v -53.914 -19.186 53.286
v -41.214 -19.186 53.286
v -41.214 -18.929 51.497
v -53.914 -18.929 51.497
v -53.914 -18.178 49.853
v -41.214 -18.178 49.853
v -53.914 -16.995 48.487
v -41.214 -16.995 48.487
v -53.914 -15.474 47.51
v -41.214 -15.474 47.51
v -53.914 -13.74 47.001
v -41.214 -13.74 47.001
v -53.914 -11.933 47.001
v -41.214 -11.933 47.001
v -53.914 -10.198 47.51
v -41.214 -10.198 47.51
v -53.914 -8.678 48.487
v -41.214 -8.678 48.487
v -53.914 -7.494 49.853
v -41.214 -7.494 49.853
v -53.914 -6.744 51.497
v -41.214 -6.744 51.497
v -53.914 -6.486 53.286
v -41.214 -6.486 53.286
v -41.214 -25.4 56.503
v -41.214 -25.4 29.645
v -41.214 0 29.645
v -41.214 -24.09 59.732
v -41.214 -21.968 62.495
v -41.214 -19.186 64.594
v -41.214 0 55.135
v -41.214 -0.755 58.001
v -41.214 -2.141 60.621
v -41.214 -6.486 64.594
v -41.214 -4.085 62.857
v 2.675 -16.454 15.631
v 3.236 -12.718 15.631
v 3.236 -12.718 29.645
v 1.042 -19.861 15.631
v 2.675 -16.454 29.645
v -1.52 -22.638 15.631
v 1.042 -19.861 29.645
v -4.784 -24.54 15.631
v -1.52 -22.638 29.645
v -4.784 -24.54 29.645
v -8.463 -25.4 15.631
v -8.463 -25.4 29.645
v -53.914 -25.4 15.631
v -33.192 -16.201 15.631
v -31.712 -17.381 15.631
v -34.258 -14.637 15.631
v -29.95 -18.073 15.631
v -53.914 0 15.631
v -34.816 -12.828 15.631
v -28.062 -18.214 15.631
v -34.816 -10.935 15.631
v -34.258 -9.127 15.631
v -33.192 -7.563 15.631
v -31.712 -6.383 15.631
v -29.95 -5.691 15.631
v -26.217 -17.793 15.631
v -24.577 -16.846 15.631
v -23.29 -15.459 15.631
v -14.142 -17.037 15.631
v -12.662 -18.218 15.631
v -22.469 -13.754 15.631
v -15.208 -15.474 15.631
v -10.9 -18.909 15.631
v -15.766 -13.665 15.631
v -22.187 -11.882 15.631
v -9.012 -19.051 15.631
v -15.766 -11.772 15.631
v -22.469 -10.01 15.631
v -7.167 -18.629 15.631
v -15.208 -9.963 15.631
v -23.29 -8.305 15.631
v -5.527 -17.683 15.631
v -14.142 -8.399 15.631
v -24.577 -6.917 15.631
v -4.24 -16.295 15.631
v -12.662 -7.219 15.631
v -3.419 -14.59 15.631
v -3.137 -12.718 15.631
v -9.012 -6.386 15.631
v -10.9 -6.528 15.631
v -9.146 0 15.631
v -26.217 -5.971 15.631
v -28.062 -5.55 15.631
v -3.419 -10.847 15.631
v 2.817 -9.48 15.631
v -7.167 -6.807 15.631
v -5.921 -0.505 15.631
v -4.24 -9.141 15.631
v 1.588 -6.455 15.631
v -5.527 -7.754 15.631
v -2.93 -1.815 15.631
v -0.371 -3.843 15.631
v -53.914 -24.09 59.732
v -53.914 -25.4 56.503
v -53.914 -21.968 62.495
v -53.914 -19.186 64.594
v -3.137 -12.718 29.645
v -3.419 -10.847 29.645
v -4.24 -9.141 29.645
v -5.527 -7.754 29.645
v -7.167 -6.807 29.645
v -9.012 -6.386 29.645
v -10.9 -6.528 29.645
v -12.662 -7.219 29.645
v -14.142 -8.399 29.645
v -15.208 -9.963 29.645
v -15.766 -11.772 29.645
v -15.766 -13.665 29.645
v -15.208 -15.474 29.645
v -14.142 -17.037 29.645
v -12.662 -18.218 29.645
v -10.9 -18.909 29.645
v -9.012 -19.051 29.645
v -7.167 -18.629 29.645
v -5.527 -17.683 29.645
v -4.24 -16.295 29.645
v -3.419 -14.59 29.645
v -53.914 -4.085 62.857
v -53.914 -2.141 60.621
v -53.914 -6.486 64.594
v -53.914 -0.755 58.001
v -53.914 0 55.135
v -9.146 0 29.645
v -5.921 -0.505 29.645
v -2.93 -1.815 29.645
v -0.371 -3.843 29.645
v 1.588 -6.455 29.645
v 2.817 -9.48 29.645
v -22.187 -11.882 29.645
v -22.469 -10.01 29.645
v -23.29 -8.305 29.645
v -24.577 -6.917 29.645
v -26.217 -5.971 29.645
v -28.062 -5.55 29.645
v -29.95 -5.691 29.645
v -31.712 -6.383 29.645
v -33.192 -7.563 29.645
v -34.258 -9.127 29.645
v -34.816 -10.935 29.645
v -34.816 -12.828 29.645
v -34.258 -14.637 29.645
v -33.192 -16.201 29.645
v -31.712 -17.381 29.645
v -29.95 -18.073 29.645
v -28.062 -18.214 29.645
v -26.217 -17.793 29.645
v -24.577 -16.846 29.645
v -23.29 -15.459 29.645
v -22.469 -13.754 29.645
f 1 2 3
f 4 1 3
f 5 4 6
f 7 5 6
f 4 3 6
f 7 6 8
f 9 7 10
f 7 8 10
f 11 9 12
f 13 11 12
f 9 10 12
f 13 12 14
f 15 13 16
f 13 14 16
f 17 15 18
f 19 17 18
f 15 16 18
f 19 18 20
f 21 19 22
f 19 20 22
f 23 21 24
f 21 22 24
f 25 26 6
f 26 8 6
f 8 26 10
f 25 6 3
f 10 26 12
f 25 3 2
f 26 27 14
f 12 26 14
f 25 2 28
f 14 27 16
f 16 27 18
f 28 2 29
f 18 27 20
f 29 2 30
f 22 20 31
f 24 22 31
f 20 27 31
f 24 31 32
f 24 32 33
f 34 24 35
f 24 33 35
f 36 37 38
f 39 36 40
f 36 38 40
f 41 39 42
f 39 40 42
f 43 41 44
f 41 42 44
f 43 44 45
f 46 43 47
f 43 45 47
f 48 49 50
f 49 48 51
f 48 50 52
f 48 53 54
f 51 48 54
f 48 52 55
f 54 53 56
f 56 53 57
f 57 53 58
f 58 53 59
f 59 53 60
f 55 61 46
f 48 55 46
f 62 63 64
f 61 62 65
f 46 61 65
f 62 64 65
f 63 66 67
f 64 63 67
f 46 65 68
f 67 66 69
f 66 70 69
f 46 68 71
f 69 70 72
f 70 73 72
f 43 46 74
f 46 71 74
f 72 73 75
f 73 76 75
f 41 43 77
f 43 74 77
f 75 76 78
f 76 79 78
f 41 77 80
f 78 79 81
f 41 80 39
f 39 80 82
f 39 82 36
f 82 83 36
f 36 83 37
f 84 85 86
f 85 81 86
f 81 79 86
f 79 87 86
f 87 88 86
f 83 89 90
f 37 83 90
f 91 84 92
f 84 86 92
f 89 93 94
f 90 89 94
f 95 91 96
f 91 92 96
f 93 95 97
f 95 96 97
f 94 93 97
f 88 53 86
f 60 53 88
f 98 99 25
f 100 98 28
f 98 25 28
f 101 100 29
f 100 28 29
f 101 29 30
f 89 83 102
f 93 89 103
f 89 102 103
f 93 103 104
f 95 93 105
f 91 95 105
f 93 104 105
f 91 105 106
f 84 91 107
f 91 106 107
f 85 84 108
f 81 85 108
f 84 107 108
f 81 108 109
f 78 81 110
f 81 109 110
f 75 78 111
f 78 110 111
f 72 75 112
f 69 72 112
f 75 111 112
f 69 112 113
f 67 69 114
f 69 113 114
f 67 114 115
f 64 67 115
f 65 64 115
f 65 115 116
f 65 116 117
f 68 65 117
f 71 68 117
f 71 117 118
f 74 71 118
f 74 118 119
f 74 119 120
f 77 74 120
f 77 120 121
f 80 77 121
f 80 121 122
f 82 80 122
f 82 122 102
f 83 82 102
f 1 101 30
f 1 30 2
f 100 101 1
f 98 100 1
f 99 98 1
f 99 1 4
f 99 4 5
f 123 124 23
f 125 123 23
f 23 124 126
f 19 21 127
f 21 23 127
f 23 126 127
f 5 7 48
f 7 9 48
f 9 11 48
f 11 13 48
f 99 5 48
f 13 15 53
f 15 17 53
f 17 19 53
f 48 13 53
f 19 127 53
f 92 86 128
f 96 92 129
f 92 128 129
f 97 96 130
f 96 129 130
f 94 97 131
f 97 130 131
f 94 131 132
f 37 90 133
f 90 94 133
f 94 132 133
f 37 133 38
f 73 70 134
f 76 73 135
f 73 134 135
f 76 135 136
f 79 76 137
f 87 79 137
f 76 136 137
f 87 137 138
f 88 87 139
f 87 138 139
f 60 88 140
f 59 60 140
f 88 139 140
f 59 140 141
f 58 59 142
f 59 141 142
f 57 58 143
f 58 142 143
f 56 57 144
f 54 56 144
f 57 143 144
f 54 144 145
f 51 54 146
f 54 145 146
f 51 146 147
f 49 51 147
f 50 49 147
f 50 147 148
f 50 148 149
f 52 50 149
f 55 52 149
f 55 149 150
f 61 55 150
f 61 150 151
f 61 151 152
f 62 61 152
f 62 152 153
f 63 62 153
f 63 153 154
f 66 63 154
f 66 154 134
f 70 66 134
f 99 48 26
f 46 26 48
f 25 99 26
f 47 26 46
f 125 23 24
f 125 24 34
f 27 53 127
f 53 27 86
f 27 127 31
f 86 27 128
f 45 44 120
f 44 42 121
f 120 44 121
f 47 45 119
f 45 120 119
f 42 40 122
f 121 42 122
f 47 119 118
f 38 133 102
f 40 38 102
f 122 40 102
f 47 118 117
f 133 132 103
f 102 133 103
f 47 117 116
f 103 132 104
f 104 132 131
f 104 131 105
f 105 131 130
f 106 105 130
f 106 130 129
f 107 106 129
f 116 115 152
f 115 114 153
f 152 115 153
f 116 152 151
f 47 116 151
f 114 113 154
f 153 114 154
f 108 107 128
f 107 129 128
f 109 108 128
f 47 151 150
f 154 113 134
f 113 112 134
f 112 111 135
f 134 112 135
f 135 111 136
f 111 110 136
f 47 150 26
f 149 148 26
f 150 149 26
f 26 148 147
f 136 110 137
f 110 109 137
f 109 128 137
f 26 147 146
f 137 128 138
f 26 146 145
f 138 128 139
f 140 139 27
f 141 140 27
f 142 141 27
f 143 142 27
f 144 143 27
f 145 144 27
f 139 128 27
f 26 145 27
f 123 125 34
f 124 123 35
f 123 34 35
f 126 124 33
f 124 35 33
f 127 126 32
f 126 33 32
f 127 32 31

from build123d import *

# Parameters (mm, degrees)
F1_DEPTH = 25.4
F3_DEPTH = 12.701
F5_DEPTH = 14.014792
F6_R     = 6.35
F7_DEPTH = 14.014792
F9_DEPTH = 12.701


with BuildPart() as f1:
    # F0 (on Front) → F1 (new body)
    with BuildSketch(Plane.XZ):
        Polygon((-41.213709, 66.43077), (-53.913709, 66.43077), (-53.913709, 15.63077), (3.236291, 15.63077), (3.236291, 29.644562), (-41.213709, 29.644562), align=None)
    extrude(amount=F1_DEPTH)

    # F2 (on face) → F3 (cut, through all)
    with BuildSketch(Plane.YZ.offset(-41.213709)):
        with BuildLine():
            ThreePointArc((-25.4, 56.502793), (-12.139061, 66.23636), (0, 55.135097))
            Line((0, 55.135097), (0, 66.43077))
            Line((0, 66.43077), (-25.4, 66.43077))
            Line((-25.4, 66.43077), (-25.4, 56.502793))
        make_face()
    extrude(amount=-F3_DEPTH, mode=Mode.SUBTRACT)

    # F4 (on face) → F5 (cut, through all)
    with BuildSketch(Plane.XY.offset(29.644562)):
        with BuildLine():
            ThreePointArc((-9.146443, 0), (-0.370686, -3.842993), (3.236291, -12.718364))
            Line((3.236291, -12.718364), (3.236291, 0))
            Line((3.236291, 0), (-9.146443, 0))
        make_face()
        with BuildLine():
            ThreePointArc((3.236291, -12.718364), (-0.135122, -21.345181), (-8.462597, -25.4))
            Line((-8.462597, -25.4), (3.236291, -25.4))
            Line((3.236291, -25.4), (3.236291, -12.718364))
        make_face()
    extrude(amount=-F5_DEPTH, mode=Mode.SUBTRACT)

    # F6 (on face) → F7 (cut, through all)
    with BuildSketch(Plane.XY.offset(29.644562)):
        with Locations((-28.536622, -11.881827)):
            Circle(F6_R)
        with Locations((-9.486622, -12.718364)):
            Circle(F6_R)
    extrude(amount=-F7_DEPTH, mode=Mode.SUBTRACT)

    # F8 (on face) → F9 (cut, through all)
    with BuildSketch(Plane.YZ.offset(-41.213709)):
        with BuildLine():
            ThreePointArc((-19.186374, 53.286288), (-12.836374, 59.636288), (-6.486374, 53.286288))
            Line((-6.486374, 53.286288), (-6.486374, 64.594166))
            ThreePointArc((-6.486374, 64.594166), (-12.836374, 66.25512), (-19.186374, 64.594166))
            Line((-19.186374, 64.594166), (-19.186374, 53.286288))
        make_face()
        with BuildLine():
            ThreePointArc((-19.186374, 53.286288), (-12.836374, 46.936288), (-6.486374, 53.286288))
            ThreePointArc((-6.486374, 53.286288), (-12.836374, 59.636288), (-19.186374, 53.286288))
        make_face()
    extrude(amount=-F9_DEPTH, mode=Mode.SUBTRACT)


solid = f1.part
